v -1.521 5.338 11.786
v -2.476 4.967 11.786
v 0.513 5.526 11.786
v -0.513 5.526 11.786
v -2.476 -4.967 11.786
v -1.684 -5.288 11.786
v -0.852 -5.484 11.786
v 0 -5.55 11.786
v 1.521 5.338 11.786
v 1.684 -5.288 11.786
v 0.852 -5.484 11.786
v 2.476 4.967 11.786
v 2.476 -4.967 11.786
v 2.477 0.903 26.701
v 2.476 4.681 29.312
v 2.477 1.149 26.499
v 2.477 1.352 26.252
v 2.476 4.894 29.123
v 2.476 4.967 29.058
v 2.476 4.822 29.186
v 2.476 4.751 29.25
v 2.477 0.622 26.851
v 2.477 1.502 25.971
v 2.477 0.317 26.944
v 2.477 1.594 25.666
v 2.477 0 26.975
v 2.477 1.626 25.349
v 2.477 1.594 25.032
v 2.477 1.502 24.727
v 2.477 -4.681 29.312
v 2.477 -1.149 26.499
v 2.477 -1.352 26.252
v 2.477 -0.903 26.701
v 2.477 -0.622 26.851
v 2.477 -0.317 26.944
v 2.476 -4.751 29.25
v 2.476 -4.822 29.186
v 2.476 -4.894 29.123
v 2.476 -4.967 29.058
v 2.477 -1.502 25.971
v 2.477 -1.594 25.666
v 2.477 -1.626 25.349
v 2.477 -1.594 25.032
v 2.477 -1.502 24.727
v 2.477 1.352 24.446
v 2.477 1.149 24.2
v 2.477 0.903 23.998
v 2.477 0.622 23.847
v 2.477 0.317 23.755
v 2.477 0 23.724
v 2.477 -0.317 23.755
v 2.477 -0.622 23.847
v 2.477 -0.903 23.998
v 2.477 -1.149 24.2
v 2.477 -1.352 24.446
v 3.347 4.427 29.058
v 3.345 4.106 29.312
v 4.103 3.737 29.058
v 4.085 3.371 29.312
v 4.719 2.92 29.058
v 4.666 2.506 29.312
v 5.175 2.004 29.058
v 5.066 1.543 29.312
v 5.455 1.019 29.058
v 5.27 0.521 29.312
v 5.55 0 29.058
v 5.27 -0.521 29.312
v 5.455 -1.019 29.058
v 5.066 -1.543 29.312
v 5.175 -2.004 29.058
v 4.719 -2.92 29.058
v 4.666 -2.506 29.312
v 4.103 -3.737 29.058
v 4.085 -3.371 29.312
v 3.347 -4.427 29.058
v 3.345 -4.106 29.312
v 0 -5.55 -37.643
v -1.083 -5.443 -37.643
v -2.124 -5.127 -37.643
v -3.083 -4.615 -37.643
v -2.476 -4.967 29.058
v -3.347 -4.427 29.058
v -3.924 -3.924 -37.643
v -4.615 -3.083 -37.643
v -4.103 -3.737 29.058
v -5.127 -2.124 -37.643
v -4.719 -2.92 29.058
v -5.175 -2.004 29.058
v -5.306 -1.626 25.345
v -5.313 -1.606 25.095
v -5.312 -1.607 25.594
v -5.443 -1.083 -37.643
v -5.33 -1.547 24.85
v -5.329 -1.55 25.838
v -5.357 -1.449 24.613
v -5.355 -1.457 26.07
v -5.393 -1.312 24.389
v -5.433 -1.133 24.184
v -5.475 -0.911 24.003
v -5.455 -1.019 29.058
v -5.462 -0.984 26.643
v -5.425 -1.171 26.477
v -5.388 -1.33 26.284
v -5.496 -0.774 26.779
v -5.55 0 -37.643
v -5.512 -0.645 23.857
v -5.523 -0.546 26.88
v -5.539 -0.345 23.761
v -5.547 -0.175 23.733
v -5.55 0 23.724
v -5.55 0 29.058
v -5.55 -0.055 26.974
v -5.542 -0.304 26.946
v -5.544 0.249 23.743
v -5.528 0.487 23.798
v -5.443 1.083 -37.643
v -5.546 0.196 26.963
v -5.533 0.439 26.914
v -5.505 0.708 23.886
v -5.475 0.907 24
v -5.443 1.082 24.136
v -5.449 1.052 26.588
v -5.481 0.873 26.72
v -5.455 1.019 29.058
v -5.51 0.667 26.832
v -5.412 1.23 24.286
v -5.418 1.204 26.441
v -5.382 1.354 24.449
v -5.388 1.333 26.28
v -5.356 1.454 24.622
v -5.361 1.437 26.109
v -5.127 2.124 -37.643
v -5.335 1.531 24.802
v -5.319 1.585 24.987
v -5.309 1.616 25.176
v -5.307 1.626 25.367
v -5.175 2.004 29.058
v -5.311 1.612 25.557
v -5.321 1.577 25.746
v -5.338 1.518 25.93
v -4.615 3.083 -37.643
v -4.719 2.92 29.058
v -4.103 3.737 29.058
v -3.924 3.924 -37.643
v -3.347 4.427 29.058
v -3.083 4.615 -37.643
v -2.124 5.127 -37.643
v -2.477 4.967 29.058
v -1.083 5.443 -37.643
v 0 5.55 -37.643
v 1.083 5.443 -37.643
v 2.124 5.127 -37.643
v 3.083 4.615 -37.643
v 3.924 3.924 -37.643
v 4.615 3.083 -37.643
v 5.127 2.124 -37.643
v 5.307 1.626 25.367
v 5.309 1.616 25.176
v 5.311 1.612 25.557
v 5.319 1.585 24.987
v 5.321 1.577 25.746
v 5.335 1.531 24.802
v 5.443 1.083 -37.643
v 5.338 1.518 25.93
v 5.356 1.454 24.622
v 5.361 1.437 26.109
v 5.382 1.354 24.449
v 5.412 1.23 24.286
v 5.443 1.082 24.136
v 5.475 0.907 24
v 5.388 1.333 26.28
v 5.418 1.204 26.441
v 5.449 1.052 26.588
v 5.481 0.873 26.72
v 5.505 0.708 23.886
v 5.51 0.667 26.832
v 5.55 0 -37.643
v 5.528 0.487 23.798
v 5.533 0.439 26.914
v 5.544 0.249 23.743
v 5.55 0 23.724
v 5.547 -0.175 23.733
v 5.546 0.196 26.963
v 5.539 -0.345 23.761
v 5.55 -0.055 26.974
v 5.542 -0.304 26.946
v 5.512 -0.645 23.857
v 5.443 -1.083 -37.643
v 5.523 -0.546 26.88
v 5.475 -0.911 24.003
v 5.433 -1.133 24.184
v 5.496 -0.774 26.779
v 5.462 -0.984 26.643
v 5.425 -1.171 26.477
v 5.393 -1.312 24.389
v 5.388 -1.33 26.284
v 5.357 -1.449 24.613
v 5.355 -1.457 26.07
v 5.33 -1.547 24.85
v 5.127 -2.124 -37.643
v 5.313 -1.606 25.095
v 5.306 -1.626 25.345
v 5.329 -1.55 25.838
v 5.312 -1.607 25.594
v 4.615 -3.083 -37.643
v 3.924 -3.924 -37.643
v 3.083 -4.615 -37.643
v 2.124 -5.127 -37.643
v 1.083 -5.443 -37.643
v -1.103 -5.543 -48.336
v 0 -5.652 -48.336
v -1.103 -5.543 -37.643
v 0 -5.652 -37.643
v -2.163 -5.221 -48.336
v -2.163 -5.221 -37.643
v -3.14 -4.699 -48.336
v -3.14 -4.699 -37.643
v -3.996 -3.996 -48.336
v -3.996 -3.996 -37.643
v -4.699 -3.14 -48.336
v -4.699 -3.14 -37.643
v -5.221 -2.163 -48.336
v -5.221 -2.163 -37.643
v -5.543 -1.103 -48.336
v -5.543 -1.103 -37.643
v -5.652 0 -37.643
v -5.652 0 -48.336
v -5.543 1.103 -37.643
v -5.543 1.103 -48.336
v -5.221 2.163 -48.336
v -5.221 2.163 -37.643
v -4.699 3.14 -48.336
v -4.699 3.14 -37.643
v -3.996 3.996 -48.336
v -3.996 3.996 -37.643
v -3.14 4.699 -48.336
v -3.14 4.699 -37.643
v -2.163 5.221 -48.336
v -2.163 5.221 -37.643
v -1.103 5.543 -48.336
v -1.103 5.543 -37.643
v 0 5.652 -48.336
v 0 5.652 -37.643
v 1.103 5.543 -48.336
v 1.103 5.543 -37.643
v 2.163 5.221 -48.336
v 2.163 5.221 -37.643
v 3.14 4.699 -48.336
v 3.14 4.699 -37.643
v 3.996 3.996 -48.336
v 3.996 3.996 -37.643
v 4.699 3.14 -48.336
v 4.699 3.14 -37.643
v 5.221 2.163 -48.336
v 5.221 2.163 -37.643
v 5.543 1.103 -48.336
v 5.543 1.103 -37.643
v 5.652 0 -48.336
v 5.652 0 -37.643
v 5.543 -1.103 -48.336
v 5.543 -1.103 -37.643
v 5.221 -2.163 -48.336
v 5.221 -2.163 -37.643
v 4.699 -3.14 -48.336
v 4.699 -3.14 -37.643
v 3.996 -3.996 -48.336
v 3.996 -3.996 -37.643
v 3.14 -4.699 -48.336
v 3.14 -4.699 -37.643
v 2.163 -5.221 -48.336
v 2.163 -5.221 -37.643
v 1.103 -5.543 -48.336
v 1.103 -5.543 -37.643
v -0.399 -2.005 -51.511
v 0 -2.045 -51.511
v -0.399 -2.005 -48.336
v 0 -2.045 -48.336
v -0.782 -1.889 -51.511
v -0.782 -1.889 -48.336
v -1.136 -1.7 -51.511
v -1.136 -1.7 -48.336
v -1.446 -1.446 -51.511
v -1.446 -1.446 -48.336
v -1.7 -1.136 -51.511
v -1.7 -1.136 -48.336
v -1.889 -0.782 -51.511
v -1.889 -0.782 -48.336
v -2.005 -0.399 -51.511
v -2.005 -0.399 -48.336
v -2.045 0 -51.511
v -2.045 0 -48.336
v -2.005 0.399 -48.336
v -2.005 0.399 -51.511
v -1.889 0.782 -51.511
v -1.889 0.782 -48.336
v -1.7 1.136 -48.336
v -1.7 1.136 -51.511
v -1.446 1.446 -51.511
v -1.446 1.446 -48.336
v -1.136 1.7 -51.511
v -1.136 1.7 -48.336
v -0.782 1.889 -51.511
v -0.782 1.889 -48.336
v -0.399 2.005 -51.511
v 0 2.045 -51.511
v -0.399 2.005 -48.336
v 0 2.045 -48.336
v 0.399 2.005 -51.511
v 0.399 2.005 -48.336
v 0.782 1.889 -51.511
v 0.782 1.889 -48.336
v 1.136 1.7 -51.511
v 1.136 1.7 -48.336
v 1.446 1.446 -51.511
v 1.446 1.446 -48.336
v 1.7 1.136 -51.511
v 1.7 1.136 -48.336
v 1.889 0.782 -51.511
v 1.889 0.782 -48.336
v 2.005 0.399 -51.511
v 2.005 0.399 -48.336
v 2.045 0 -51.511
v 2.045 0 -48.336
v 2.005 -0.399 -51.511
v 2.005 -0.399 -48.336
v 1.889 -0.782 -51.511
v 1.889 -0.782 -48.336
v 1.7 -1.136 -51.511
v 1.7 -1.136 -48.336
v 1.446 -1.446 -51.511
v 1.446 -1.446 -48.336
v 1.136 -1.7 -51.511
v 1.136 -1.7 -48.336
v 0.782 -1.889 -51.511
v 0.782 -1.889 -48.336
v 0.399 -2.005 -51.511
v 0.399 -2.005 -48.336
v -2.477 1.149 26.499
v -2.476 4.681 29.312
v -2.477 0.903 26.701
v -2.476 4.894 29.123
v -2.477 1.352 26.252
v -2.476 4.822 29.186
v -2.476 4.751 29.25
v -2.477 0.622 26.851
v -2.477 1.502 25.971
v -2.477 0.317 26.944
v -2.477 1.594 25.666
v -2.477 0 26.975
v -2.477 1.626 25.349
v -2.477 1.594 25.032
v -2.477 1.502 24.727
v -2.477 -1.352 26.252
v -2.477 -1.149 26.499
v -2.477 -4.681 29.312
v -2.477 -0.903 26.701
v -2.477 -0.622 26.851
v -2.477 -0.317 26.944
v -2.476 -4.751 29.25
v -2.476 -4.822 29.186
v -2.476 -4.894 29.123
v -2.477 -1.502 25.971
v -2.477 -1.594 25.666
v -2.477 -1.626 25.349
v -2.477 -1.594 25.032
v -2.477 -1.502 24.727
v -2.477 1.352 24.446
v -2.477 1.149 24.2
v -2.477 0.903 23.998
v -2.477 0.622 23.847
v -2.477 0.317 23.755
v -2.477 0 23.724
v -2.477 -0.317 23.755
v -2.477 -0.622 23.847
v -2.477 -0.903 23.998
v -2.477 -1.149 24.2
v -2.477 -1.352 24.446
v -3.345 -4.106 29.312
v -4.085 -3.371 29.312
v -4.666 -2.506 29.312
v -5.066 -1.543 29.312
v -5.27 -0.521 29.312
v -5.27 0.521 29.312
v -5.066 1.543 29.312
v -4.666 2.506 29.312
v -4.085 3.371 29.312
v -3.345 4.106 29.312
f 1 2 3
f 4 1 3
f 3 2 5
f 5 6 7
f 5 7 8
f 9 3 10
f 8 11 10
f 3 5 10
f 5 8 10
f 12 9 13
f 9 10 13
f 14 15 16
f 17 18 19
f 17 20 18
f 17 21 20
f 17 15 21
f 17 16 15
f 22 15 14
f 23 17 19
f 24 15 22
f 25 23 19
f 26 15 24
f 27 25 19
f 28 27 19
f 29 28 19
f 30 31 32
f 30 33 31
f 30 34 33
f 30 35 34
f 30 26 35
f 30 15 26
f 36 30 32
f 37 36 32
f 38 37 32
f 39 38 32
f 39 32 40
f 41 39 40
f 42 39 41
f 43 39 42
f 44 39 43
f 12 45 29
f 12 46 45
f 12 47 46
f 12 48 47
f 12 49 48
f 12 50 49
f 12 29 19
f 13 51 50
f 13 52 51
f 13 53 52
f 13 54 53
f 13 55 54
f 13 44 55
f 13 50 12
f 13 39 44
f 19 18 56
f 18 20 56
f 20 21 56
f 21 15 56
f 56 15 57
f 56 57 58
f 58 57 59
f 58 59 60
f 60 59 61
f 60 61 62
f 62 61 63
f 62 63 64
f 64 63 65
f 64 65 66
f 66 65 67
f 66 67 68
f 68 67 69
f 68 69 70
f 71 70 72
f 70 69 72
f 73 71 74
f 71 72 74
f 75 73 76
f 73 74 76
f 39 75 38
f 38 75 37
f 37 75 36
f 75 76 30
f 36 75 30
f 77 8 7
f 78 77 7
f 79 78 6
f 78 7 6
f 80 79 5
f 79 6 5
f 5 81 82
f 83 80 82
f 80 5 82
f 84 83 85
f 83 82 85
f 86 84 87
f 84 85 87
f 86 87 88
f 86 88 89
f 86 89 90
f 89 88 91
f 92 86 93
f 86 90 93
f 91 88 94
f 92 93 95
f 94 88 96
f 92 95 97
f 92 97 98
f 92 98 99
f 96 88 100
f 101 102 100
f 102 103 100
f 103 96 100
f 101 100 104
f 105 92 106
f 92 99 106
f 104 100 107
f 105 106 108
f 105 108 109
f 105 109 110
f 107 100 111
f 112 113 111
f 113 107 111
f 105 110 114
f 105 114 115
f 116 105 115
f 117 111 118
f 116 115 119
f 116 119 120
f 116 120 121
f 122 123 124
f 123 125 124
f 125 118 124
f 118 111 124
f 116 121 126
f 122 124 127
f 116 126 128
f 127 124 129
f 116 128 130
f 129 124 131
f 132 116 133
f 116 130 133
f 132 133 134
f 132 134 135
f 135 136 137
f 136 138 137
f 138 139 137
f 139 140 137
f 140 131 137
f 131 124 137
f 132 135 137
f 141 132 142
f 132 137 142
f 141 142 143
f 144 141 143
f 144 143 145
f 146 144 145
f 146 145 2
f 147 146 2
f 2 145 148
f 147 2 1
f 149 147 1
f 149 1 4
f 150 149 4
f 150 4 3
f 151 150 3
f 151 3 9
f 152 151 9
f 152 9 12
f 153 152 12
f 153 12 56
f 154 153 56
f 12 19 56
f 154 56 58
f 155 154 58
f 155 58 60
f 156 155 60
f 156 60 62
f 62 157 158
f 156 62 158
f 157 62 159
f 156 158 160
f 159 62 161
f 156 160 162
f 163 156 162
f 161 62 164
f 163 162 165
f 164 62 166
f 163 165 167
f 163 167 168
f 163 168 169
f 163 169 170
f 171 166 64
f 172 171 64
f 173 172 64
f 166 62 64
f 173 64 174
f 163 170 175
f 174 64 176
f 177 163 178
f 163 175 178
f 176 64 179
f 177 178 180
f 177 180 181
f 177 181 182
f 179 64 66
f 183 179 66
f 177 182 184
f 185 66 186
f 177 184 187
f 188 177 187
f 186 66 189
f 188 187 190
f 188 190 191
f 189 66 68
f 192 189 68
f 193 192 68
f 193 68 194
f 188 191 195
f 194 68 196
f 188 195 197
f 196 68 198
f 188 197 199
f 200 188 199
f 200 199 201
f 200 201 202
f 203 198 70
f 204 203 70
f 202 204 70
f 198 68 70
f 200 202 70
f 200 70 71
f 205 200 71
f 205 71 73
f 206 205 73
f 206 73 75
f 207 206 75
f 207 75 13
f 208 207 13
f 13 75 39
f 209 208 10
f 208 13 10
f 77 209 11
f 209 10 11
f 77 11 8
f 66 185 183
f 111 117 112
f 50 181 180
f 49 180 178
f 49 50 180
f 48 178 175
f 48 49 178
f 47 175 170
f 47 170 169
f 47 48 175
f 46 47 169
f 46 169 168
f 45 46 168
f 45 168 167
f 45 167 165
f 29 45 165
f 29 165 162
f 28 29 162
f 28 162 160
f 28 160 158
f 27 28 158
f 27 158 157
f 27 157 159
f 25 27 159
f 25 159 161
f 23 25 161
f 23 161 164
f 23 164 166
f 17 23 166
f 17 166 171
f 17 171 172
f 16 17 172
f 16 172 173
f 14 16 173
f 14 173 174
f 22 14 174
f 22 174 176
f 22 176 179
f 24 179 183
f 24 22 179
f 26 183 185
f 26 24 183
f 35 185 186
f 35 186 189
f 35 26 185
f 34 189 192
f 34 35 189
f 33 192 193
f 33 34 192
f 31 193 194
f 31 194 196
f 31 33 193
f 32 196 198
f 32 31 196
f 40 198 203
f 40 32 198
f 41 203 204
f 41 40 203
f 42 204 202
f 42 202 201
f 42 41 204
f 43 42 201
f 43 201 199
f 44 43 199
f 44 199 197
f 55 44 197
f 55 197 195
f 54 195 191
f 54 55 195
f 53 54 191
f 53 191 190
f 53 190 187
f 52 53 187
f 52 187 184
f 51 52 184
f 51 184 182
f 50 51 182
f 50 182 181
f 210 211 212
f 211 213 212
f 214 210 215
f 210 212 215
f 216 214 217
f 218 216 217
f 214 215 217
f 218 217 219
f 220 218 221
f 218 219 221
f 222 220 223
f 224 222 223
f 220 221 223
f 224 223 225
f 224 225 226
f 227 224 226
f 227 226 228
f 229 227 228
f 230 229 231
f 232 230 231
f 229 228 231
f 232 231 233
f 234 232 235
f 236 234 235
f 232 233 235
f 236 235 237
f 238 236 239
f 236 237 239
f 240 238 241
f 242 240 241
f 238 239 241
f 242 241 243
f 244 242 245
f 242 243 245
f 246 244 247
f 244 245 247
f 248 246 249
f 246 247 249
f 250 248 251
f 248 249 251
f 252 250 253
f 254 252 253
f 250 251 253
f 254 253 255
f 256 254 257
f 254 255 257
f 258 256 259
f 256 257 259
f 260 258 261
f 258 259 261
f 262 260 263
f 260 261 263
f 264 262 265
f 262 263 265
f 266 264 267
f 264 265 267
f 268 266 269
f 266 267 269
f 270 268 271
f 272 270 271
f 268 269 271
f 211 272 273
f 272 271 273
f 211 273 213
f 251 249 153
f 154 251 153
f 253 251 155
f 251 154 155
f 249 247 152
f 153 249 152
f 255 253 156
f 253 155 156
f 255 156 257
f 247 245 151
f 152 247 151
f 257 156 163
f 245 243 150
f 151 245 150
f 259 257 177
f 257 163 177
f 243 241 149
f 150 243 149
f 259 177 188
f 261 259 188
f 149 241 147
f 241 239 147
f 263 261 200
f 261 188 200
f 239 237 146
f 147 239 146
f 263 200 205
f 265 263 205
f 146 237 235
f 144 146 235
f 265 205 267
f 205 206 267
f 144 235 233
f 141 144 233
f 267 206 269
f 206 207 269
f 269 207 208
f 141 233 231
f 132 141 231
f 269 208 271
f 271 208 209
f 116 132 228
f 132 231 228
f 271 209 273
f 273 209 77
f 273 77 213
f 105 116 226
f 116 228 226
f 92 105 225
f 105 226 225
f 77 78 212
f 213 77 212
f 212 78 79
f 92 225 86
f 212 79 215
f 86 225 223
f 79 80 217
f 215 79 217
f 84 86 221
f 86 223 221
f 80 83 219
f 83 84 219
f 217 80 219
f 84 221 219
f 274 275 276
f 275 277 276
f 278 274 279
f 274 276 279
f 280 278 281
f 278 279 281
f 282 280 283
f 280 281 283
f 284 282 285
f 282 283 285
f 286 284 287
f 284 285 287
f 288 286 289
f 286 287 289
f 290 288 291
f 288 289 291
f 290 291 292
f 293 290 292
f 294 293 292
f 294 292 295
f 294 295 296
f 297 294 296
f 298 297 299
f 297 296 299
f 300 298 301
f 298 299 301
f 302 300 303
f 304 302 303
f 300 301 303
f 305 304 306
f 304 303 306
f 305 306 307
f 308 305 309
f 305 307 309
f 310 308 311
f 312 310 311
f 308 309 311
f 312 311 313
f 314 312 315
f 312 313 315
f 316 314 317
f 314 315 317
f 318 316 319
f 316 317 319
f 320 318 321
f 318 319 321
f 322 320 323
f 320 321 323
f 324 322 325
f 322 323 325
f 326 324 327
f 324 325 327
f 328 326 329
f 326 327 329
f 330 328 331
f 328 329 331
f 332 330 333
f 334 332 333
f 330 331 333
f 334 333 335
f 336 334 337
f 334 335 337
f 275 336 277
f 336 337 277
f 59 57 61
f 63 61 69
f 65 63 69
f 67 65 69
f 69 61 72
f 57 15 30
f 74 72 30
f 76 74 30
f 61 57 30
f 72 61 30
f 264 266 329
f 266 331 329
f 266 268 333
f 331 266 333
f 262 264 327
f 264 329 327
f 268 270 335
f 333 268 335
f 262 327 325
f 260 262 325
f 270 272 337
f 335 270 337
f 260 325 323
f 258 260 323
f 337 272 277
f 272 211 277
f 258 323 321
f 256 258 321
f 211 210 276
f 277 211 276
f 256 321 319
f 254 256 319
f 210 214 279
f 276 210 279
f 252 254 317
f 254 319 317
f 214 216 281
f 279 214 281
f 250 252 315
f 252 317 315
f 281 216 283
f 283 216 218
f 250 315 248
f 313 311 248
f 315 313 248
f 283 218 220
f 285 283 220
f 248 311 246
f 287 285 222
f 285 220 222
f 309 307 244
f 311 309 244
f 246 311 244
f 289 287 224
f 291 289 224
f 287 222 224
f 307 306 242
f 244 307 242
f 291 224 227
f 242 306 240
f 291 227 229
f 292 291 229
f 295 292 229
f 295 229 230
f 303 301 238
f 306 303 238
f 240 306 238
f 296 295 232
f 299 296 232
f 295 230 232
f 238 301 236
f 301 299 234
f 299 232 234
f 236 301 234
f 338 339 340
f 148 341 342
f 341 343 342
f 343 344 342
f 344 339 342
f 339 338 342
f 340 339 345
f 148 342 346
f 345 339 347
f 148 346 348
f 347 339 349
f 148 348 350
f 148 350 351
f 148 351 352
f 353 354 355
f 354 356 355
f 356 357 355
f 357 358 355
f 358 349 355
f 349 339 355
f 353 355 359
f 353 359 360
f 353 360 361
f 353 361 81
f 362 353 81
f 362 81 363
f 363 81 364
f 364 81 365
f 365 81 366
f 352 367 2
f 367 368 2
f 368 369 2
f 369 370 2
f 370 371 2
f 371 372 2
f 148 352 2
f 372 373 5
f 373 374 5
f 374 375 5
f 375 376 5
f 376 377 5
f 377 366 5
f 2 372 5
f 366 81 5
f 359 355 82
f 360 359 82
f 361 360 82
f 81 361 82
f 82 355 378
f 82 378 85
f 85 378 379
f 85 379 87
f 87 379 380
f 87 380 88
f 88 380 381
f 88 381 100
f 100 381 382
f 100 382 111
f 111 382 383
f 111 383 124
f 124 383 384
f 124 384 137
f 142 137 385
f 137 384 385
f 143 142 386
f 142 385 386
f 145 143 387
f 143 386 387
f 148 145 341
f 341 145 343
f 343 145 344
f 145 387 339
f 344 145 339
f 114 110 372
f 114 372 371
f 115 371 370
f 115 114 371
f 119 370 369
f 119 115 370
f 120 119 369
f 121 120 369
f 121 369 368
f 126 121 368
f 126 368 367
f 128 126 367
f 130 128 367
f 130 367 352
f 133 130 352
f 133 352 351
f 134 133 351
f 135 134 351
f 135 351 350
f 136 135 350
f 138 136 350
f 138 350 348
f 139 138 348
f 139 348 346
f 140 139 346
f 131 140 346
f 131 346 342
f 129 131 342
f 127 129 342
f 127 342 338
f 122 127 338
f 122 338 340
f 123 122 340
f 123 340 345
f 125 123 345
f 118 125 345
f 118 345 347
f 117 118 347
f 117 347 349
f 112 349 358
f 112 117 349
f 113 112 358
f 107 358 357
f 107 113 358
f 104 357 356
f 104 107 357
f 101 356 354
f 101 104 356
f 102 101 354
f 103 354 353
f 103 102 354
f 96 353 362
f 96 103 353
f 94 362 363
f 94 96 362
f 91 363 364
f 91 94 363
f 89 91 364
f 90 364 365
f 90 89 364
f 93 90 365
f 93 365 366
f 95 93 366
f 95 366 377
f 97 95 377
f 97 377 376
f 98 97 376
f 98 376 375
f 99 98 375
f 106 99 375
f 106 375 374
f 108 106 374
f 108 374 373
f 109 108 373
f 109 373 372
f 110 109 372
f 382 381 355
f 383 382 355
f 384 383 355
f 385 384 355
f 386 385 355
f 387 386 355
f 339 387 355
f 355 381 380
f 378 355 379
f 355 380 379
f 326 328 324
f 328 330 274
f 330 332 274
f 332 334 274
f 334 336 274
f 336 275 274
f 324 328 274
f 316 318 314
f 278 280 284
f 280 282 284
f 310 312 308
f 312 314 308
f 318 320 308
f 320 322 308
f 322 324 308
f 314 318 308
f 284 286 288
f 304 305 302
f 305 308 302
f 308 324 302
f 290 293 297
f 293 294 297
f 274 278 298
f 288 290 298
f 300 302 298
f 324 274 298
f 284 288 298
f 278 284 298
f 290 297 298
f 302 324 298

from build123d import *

# Parameters (mm, degrees)
CUT_EXTRUDE4_DEPTH      = 5.5499
CUT_EXTRUDE4_DEPTH_BACK = 5.5499
SKETCH18_W              = 4.953
SKETCH18_H              = 17.526
CUT_EXTRUDE5_DEPTH      = 53.127561136
CUT_EXTRUDE5_DEPTH_BACK = 53.127561136
SKETCH19_R              = 1.6256


with BuildPart() as part:
    # Sketch17 → Revolve2 (revolve)
    with BuildSketch(Plane(origin=(0, 0, 0), x_dir=(0, 0, -1), z_dir=(1, 0, 0)), mode=Mode.PRIVATE) as revolve2_sk:
        Polygon((-29.3116, 0), (51.5112, 0), (51.5112, 2.0447), (48.3362, 2.0447), (48.3362, 5.6515), (37.6428, 5.6515), (37.6428, 5.5499), (-29.0576, 5.5499), (-29.3116, 5.2959), align=None)
    revolve(revolve2_sk.sketch.rotate(Axis((0, 0, 29.3116), (0, 0, -1)), 180), axis=Axis((0, 0, 29.3116), (0, 0, -1)))

    # Sketch18 → Cut-Extrude4 (cut, two sides: drawn at the far end of the back side and taken through both)
    with BuildSketch(Plane(origin=(0, 0, 0), x_dir=(1, 0, 0), z_dir=(0, 1, 0)).offset(-CUT_EXTRUDE4_DEPTH_BACK)):
        with Locations((0, -20.5486)):
            Rectangle(SKETCH18_W, SKETCH18_H)
    extrude(amount=CUT_EXTRUDE4_DEPTH + CUT_EXTRUDE4_DEPTH_BACK, mode=Mode.SUBTRACT)

    # Sketch19 → Cut-Extrude5 (cut, two sides: drawn at the far end of the back side and taken through both)
    with BuildSketch(Plane(origin=(0, 0, 0), x_dir=(0, 0, -1), z_dir=(1, 0, 0)).offset(-CUT_EXTRUDE5_DEPTH_BACK)):
        with Locations((-25.3492, 0)):
            Circle(SKETCH19_R)
    extrude(amount=CUT_EXTRUDE5_DEPTH + CUT_EXTRUDE5_DEPTH_BACK, mode=Mode.SUBTRACT)


solid = part.part
